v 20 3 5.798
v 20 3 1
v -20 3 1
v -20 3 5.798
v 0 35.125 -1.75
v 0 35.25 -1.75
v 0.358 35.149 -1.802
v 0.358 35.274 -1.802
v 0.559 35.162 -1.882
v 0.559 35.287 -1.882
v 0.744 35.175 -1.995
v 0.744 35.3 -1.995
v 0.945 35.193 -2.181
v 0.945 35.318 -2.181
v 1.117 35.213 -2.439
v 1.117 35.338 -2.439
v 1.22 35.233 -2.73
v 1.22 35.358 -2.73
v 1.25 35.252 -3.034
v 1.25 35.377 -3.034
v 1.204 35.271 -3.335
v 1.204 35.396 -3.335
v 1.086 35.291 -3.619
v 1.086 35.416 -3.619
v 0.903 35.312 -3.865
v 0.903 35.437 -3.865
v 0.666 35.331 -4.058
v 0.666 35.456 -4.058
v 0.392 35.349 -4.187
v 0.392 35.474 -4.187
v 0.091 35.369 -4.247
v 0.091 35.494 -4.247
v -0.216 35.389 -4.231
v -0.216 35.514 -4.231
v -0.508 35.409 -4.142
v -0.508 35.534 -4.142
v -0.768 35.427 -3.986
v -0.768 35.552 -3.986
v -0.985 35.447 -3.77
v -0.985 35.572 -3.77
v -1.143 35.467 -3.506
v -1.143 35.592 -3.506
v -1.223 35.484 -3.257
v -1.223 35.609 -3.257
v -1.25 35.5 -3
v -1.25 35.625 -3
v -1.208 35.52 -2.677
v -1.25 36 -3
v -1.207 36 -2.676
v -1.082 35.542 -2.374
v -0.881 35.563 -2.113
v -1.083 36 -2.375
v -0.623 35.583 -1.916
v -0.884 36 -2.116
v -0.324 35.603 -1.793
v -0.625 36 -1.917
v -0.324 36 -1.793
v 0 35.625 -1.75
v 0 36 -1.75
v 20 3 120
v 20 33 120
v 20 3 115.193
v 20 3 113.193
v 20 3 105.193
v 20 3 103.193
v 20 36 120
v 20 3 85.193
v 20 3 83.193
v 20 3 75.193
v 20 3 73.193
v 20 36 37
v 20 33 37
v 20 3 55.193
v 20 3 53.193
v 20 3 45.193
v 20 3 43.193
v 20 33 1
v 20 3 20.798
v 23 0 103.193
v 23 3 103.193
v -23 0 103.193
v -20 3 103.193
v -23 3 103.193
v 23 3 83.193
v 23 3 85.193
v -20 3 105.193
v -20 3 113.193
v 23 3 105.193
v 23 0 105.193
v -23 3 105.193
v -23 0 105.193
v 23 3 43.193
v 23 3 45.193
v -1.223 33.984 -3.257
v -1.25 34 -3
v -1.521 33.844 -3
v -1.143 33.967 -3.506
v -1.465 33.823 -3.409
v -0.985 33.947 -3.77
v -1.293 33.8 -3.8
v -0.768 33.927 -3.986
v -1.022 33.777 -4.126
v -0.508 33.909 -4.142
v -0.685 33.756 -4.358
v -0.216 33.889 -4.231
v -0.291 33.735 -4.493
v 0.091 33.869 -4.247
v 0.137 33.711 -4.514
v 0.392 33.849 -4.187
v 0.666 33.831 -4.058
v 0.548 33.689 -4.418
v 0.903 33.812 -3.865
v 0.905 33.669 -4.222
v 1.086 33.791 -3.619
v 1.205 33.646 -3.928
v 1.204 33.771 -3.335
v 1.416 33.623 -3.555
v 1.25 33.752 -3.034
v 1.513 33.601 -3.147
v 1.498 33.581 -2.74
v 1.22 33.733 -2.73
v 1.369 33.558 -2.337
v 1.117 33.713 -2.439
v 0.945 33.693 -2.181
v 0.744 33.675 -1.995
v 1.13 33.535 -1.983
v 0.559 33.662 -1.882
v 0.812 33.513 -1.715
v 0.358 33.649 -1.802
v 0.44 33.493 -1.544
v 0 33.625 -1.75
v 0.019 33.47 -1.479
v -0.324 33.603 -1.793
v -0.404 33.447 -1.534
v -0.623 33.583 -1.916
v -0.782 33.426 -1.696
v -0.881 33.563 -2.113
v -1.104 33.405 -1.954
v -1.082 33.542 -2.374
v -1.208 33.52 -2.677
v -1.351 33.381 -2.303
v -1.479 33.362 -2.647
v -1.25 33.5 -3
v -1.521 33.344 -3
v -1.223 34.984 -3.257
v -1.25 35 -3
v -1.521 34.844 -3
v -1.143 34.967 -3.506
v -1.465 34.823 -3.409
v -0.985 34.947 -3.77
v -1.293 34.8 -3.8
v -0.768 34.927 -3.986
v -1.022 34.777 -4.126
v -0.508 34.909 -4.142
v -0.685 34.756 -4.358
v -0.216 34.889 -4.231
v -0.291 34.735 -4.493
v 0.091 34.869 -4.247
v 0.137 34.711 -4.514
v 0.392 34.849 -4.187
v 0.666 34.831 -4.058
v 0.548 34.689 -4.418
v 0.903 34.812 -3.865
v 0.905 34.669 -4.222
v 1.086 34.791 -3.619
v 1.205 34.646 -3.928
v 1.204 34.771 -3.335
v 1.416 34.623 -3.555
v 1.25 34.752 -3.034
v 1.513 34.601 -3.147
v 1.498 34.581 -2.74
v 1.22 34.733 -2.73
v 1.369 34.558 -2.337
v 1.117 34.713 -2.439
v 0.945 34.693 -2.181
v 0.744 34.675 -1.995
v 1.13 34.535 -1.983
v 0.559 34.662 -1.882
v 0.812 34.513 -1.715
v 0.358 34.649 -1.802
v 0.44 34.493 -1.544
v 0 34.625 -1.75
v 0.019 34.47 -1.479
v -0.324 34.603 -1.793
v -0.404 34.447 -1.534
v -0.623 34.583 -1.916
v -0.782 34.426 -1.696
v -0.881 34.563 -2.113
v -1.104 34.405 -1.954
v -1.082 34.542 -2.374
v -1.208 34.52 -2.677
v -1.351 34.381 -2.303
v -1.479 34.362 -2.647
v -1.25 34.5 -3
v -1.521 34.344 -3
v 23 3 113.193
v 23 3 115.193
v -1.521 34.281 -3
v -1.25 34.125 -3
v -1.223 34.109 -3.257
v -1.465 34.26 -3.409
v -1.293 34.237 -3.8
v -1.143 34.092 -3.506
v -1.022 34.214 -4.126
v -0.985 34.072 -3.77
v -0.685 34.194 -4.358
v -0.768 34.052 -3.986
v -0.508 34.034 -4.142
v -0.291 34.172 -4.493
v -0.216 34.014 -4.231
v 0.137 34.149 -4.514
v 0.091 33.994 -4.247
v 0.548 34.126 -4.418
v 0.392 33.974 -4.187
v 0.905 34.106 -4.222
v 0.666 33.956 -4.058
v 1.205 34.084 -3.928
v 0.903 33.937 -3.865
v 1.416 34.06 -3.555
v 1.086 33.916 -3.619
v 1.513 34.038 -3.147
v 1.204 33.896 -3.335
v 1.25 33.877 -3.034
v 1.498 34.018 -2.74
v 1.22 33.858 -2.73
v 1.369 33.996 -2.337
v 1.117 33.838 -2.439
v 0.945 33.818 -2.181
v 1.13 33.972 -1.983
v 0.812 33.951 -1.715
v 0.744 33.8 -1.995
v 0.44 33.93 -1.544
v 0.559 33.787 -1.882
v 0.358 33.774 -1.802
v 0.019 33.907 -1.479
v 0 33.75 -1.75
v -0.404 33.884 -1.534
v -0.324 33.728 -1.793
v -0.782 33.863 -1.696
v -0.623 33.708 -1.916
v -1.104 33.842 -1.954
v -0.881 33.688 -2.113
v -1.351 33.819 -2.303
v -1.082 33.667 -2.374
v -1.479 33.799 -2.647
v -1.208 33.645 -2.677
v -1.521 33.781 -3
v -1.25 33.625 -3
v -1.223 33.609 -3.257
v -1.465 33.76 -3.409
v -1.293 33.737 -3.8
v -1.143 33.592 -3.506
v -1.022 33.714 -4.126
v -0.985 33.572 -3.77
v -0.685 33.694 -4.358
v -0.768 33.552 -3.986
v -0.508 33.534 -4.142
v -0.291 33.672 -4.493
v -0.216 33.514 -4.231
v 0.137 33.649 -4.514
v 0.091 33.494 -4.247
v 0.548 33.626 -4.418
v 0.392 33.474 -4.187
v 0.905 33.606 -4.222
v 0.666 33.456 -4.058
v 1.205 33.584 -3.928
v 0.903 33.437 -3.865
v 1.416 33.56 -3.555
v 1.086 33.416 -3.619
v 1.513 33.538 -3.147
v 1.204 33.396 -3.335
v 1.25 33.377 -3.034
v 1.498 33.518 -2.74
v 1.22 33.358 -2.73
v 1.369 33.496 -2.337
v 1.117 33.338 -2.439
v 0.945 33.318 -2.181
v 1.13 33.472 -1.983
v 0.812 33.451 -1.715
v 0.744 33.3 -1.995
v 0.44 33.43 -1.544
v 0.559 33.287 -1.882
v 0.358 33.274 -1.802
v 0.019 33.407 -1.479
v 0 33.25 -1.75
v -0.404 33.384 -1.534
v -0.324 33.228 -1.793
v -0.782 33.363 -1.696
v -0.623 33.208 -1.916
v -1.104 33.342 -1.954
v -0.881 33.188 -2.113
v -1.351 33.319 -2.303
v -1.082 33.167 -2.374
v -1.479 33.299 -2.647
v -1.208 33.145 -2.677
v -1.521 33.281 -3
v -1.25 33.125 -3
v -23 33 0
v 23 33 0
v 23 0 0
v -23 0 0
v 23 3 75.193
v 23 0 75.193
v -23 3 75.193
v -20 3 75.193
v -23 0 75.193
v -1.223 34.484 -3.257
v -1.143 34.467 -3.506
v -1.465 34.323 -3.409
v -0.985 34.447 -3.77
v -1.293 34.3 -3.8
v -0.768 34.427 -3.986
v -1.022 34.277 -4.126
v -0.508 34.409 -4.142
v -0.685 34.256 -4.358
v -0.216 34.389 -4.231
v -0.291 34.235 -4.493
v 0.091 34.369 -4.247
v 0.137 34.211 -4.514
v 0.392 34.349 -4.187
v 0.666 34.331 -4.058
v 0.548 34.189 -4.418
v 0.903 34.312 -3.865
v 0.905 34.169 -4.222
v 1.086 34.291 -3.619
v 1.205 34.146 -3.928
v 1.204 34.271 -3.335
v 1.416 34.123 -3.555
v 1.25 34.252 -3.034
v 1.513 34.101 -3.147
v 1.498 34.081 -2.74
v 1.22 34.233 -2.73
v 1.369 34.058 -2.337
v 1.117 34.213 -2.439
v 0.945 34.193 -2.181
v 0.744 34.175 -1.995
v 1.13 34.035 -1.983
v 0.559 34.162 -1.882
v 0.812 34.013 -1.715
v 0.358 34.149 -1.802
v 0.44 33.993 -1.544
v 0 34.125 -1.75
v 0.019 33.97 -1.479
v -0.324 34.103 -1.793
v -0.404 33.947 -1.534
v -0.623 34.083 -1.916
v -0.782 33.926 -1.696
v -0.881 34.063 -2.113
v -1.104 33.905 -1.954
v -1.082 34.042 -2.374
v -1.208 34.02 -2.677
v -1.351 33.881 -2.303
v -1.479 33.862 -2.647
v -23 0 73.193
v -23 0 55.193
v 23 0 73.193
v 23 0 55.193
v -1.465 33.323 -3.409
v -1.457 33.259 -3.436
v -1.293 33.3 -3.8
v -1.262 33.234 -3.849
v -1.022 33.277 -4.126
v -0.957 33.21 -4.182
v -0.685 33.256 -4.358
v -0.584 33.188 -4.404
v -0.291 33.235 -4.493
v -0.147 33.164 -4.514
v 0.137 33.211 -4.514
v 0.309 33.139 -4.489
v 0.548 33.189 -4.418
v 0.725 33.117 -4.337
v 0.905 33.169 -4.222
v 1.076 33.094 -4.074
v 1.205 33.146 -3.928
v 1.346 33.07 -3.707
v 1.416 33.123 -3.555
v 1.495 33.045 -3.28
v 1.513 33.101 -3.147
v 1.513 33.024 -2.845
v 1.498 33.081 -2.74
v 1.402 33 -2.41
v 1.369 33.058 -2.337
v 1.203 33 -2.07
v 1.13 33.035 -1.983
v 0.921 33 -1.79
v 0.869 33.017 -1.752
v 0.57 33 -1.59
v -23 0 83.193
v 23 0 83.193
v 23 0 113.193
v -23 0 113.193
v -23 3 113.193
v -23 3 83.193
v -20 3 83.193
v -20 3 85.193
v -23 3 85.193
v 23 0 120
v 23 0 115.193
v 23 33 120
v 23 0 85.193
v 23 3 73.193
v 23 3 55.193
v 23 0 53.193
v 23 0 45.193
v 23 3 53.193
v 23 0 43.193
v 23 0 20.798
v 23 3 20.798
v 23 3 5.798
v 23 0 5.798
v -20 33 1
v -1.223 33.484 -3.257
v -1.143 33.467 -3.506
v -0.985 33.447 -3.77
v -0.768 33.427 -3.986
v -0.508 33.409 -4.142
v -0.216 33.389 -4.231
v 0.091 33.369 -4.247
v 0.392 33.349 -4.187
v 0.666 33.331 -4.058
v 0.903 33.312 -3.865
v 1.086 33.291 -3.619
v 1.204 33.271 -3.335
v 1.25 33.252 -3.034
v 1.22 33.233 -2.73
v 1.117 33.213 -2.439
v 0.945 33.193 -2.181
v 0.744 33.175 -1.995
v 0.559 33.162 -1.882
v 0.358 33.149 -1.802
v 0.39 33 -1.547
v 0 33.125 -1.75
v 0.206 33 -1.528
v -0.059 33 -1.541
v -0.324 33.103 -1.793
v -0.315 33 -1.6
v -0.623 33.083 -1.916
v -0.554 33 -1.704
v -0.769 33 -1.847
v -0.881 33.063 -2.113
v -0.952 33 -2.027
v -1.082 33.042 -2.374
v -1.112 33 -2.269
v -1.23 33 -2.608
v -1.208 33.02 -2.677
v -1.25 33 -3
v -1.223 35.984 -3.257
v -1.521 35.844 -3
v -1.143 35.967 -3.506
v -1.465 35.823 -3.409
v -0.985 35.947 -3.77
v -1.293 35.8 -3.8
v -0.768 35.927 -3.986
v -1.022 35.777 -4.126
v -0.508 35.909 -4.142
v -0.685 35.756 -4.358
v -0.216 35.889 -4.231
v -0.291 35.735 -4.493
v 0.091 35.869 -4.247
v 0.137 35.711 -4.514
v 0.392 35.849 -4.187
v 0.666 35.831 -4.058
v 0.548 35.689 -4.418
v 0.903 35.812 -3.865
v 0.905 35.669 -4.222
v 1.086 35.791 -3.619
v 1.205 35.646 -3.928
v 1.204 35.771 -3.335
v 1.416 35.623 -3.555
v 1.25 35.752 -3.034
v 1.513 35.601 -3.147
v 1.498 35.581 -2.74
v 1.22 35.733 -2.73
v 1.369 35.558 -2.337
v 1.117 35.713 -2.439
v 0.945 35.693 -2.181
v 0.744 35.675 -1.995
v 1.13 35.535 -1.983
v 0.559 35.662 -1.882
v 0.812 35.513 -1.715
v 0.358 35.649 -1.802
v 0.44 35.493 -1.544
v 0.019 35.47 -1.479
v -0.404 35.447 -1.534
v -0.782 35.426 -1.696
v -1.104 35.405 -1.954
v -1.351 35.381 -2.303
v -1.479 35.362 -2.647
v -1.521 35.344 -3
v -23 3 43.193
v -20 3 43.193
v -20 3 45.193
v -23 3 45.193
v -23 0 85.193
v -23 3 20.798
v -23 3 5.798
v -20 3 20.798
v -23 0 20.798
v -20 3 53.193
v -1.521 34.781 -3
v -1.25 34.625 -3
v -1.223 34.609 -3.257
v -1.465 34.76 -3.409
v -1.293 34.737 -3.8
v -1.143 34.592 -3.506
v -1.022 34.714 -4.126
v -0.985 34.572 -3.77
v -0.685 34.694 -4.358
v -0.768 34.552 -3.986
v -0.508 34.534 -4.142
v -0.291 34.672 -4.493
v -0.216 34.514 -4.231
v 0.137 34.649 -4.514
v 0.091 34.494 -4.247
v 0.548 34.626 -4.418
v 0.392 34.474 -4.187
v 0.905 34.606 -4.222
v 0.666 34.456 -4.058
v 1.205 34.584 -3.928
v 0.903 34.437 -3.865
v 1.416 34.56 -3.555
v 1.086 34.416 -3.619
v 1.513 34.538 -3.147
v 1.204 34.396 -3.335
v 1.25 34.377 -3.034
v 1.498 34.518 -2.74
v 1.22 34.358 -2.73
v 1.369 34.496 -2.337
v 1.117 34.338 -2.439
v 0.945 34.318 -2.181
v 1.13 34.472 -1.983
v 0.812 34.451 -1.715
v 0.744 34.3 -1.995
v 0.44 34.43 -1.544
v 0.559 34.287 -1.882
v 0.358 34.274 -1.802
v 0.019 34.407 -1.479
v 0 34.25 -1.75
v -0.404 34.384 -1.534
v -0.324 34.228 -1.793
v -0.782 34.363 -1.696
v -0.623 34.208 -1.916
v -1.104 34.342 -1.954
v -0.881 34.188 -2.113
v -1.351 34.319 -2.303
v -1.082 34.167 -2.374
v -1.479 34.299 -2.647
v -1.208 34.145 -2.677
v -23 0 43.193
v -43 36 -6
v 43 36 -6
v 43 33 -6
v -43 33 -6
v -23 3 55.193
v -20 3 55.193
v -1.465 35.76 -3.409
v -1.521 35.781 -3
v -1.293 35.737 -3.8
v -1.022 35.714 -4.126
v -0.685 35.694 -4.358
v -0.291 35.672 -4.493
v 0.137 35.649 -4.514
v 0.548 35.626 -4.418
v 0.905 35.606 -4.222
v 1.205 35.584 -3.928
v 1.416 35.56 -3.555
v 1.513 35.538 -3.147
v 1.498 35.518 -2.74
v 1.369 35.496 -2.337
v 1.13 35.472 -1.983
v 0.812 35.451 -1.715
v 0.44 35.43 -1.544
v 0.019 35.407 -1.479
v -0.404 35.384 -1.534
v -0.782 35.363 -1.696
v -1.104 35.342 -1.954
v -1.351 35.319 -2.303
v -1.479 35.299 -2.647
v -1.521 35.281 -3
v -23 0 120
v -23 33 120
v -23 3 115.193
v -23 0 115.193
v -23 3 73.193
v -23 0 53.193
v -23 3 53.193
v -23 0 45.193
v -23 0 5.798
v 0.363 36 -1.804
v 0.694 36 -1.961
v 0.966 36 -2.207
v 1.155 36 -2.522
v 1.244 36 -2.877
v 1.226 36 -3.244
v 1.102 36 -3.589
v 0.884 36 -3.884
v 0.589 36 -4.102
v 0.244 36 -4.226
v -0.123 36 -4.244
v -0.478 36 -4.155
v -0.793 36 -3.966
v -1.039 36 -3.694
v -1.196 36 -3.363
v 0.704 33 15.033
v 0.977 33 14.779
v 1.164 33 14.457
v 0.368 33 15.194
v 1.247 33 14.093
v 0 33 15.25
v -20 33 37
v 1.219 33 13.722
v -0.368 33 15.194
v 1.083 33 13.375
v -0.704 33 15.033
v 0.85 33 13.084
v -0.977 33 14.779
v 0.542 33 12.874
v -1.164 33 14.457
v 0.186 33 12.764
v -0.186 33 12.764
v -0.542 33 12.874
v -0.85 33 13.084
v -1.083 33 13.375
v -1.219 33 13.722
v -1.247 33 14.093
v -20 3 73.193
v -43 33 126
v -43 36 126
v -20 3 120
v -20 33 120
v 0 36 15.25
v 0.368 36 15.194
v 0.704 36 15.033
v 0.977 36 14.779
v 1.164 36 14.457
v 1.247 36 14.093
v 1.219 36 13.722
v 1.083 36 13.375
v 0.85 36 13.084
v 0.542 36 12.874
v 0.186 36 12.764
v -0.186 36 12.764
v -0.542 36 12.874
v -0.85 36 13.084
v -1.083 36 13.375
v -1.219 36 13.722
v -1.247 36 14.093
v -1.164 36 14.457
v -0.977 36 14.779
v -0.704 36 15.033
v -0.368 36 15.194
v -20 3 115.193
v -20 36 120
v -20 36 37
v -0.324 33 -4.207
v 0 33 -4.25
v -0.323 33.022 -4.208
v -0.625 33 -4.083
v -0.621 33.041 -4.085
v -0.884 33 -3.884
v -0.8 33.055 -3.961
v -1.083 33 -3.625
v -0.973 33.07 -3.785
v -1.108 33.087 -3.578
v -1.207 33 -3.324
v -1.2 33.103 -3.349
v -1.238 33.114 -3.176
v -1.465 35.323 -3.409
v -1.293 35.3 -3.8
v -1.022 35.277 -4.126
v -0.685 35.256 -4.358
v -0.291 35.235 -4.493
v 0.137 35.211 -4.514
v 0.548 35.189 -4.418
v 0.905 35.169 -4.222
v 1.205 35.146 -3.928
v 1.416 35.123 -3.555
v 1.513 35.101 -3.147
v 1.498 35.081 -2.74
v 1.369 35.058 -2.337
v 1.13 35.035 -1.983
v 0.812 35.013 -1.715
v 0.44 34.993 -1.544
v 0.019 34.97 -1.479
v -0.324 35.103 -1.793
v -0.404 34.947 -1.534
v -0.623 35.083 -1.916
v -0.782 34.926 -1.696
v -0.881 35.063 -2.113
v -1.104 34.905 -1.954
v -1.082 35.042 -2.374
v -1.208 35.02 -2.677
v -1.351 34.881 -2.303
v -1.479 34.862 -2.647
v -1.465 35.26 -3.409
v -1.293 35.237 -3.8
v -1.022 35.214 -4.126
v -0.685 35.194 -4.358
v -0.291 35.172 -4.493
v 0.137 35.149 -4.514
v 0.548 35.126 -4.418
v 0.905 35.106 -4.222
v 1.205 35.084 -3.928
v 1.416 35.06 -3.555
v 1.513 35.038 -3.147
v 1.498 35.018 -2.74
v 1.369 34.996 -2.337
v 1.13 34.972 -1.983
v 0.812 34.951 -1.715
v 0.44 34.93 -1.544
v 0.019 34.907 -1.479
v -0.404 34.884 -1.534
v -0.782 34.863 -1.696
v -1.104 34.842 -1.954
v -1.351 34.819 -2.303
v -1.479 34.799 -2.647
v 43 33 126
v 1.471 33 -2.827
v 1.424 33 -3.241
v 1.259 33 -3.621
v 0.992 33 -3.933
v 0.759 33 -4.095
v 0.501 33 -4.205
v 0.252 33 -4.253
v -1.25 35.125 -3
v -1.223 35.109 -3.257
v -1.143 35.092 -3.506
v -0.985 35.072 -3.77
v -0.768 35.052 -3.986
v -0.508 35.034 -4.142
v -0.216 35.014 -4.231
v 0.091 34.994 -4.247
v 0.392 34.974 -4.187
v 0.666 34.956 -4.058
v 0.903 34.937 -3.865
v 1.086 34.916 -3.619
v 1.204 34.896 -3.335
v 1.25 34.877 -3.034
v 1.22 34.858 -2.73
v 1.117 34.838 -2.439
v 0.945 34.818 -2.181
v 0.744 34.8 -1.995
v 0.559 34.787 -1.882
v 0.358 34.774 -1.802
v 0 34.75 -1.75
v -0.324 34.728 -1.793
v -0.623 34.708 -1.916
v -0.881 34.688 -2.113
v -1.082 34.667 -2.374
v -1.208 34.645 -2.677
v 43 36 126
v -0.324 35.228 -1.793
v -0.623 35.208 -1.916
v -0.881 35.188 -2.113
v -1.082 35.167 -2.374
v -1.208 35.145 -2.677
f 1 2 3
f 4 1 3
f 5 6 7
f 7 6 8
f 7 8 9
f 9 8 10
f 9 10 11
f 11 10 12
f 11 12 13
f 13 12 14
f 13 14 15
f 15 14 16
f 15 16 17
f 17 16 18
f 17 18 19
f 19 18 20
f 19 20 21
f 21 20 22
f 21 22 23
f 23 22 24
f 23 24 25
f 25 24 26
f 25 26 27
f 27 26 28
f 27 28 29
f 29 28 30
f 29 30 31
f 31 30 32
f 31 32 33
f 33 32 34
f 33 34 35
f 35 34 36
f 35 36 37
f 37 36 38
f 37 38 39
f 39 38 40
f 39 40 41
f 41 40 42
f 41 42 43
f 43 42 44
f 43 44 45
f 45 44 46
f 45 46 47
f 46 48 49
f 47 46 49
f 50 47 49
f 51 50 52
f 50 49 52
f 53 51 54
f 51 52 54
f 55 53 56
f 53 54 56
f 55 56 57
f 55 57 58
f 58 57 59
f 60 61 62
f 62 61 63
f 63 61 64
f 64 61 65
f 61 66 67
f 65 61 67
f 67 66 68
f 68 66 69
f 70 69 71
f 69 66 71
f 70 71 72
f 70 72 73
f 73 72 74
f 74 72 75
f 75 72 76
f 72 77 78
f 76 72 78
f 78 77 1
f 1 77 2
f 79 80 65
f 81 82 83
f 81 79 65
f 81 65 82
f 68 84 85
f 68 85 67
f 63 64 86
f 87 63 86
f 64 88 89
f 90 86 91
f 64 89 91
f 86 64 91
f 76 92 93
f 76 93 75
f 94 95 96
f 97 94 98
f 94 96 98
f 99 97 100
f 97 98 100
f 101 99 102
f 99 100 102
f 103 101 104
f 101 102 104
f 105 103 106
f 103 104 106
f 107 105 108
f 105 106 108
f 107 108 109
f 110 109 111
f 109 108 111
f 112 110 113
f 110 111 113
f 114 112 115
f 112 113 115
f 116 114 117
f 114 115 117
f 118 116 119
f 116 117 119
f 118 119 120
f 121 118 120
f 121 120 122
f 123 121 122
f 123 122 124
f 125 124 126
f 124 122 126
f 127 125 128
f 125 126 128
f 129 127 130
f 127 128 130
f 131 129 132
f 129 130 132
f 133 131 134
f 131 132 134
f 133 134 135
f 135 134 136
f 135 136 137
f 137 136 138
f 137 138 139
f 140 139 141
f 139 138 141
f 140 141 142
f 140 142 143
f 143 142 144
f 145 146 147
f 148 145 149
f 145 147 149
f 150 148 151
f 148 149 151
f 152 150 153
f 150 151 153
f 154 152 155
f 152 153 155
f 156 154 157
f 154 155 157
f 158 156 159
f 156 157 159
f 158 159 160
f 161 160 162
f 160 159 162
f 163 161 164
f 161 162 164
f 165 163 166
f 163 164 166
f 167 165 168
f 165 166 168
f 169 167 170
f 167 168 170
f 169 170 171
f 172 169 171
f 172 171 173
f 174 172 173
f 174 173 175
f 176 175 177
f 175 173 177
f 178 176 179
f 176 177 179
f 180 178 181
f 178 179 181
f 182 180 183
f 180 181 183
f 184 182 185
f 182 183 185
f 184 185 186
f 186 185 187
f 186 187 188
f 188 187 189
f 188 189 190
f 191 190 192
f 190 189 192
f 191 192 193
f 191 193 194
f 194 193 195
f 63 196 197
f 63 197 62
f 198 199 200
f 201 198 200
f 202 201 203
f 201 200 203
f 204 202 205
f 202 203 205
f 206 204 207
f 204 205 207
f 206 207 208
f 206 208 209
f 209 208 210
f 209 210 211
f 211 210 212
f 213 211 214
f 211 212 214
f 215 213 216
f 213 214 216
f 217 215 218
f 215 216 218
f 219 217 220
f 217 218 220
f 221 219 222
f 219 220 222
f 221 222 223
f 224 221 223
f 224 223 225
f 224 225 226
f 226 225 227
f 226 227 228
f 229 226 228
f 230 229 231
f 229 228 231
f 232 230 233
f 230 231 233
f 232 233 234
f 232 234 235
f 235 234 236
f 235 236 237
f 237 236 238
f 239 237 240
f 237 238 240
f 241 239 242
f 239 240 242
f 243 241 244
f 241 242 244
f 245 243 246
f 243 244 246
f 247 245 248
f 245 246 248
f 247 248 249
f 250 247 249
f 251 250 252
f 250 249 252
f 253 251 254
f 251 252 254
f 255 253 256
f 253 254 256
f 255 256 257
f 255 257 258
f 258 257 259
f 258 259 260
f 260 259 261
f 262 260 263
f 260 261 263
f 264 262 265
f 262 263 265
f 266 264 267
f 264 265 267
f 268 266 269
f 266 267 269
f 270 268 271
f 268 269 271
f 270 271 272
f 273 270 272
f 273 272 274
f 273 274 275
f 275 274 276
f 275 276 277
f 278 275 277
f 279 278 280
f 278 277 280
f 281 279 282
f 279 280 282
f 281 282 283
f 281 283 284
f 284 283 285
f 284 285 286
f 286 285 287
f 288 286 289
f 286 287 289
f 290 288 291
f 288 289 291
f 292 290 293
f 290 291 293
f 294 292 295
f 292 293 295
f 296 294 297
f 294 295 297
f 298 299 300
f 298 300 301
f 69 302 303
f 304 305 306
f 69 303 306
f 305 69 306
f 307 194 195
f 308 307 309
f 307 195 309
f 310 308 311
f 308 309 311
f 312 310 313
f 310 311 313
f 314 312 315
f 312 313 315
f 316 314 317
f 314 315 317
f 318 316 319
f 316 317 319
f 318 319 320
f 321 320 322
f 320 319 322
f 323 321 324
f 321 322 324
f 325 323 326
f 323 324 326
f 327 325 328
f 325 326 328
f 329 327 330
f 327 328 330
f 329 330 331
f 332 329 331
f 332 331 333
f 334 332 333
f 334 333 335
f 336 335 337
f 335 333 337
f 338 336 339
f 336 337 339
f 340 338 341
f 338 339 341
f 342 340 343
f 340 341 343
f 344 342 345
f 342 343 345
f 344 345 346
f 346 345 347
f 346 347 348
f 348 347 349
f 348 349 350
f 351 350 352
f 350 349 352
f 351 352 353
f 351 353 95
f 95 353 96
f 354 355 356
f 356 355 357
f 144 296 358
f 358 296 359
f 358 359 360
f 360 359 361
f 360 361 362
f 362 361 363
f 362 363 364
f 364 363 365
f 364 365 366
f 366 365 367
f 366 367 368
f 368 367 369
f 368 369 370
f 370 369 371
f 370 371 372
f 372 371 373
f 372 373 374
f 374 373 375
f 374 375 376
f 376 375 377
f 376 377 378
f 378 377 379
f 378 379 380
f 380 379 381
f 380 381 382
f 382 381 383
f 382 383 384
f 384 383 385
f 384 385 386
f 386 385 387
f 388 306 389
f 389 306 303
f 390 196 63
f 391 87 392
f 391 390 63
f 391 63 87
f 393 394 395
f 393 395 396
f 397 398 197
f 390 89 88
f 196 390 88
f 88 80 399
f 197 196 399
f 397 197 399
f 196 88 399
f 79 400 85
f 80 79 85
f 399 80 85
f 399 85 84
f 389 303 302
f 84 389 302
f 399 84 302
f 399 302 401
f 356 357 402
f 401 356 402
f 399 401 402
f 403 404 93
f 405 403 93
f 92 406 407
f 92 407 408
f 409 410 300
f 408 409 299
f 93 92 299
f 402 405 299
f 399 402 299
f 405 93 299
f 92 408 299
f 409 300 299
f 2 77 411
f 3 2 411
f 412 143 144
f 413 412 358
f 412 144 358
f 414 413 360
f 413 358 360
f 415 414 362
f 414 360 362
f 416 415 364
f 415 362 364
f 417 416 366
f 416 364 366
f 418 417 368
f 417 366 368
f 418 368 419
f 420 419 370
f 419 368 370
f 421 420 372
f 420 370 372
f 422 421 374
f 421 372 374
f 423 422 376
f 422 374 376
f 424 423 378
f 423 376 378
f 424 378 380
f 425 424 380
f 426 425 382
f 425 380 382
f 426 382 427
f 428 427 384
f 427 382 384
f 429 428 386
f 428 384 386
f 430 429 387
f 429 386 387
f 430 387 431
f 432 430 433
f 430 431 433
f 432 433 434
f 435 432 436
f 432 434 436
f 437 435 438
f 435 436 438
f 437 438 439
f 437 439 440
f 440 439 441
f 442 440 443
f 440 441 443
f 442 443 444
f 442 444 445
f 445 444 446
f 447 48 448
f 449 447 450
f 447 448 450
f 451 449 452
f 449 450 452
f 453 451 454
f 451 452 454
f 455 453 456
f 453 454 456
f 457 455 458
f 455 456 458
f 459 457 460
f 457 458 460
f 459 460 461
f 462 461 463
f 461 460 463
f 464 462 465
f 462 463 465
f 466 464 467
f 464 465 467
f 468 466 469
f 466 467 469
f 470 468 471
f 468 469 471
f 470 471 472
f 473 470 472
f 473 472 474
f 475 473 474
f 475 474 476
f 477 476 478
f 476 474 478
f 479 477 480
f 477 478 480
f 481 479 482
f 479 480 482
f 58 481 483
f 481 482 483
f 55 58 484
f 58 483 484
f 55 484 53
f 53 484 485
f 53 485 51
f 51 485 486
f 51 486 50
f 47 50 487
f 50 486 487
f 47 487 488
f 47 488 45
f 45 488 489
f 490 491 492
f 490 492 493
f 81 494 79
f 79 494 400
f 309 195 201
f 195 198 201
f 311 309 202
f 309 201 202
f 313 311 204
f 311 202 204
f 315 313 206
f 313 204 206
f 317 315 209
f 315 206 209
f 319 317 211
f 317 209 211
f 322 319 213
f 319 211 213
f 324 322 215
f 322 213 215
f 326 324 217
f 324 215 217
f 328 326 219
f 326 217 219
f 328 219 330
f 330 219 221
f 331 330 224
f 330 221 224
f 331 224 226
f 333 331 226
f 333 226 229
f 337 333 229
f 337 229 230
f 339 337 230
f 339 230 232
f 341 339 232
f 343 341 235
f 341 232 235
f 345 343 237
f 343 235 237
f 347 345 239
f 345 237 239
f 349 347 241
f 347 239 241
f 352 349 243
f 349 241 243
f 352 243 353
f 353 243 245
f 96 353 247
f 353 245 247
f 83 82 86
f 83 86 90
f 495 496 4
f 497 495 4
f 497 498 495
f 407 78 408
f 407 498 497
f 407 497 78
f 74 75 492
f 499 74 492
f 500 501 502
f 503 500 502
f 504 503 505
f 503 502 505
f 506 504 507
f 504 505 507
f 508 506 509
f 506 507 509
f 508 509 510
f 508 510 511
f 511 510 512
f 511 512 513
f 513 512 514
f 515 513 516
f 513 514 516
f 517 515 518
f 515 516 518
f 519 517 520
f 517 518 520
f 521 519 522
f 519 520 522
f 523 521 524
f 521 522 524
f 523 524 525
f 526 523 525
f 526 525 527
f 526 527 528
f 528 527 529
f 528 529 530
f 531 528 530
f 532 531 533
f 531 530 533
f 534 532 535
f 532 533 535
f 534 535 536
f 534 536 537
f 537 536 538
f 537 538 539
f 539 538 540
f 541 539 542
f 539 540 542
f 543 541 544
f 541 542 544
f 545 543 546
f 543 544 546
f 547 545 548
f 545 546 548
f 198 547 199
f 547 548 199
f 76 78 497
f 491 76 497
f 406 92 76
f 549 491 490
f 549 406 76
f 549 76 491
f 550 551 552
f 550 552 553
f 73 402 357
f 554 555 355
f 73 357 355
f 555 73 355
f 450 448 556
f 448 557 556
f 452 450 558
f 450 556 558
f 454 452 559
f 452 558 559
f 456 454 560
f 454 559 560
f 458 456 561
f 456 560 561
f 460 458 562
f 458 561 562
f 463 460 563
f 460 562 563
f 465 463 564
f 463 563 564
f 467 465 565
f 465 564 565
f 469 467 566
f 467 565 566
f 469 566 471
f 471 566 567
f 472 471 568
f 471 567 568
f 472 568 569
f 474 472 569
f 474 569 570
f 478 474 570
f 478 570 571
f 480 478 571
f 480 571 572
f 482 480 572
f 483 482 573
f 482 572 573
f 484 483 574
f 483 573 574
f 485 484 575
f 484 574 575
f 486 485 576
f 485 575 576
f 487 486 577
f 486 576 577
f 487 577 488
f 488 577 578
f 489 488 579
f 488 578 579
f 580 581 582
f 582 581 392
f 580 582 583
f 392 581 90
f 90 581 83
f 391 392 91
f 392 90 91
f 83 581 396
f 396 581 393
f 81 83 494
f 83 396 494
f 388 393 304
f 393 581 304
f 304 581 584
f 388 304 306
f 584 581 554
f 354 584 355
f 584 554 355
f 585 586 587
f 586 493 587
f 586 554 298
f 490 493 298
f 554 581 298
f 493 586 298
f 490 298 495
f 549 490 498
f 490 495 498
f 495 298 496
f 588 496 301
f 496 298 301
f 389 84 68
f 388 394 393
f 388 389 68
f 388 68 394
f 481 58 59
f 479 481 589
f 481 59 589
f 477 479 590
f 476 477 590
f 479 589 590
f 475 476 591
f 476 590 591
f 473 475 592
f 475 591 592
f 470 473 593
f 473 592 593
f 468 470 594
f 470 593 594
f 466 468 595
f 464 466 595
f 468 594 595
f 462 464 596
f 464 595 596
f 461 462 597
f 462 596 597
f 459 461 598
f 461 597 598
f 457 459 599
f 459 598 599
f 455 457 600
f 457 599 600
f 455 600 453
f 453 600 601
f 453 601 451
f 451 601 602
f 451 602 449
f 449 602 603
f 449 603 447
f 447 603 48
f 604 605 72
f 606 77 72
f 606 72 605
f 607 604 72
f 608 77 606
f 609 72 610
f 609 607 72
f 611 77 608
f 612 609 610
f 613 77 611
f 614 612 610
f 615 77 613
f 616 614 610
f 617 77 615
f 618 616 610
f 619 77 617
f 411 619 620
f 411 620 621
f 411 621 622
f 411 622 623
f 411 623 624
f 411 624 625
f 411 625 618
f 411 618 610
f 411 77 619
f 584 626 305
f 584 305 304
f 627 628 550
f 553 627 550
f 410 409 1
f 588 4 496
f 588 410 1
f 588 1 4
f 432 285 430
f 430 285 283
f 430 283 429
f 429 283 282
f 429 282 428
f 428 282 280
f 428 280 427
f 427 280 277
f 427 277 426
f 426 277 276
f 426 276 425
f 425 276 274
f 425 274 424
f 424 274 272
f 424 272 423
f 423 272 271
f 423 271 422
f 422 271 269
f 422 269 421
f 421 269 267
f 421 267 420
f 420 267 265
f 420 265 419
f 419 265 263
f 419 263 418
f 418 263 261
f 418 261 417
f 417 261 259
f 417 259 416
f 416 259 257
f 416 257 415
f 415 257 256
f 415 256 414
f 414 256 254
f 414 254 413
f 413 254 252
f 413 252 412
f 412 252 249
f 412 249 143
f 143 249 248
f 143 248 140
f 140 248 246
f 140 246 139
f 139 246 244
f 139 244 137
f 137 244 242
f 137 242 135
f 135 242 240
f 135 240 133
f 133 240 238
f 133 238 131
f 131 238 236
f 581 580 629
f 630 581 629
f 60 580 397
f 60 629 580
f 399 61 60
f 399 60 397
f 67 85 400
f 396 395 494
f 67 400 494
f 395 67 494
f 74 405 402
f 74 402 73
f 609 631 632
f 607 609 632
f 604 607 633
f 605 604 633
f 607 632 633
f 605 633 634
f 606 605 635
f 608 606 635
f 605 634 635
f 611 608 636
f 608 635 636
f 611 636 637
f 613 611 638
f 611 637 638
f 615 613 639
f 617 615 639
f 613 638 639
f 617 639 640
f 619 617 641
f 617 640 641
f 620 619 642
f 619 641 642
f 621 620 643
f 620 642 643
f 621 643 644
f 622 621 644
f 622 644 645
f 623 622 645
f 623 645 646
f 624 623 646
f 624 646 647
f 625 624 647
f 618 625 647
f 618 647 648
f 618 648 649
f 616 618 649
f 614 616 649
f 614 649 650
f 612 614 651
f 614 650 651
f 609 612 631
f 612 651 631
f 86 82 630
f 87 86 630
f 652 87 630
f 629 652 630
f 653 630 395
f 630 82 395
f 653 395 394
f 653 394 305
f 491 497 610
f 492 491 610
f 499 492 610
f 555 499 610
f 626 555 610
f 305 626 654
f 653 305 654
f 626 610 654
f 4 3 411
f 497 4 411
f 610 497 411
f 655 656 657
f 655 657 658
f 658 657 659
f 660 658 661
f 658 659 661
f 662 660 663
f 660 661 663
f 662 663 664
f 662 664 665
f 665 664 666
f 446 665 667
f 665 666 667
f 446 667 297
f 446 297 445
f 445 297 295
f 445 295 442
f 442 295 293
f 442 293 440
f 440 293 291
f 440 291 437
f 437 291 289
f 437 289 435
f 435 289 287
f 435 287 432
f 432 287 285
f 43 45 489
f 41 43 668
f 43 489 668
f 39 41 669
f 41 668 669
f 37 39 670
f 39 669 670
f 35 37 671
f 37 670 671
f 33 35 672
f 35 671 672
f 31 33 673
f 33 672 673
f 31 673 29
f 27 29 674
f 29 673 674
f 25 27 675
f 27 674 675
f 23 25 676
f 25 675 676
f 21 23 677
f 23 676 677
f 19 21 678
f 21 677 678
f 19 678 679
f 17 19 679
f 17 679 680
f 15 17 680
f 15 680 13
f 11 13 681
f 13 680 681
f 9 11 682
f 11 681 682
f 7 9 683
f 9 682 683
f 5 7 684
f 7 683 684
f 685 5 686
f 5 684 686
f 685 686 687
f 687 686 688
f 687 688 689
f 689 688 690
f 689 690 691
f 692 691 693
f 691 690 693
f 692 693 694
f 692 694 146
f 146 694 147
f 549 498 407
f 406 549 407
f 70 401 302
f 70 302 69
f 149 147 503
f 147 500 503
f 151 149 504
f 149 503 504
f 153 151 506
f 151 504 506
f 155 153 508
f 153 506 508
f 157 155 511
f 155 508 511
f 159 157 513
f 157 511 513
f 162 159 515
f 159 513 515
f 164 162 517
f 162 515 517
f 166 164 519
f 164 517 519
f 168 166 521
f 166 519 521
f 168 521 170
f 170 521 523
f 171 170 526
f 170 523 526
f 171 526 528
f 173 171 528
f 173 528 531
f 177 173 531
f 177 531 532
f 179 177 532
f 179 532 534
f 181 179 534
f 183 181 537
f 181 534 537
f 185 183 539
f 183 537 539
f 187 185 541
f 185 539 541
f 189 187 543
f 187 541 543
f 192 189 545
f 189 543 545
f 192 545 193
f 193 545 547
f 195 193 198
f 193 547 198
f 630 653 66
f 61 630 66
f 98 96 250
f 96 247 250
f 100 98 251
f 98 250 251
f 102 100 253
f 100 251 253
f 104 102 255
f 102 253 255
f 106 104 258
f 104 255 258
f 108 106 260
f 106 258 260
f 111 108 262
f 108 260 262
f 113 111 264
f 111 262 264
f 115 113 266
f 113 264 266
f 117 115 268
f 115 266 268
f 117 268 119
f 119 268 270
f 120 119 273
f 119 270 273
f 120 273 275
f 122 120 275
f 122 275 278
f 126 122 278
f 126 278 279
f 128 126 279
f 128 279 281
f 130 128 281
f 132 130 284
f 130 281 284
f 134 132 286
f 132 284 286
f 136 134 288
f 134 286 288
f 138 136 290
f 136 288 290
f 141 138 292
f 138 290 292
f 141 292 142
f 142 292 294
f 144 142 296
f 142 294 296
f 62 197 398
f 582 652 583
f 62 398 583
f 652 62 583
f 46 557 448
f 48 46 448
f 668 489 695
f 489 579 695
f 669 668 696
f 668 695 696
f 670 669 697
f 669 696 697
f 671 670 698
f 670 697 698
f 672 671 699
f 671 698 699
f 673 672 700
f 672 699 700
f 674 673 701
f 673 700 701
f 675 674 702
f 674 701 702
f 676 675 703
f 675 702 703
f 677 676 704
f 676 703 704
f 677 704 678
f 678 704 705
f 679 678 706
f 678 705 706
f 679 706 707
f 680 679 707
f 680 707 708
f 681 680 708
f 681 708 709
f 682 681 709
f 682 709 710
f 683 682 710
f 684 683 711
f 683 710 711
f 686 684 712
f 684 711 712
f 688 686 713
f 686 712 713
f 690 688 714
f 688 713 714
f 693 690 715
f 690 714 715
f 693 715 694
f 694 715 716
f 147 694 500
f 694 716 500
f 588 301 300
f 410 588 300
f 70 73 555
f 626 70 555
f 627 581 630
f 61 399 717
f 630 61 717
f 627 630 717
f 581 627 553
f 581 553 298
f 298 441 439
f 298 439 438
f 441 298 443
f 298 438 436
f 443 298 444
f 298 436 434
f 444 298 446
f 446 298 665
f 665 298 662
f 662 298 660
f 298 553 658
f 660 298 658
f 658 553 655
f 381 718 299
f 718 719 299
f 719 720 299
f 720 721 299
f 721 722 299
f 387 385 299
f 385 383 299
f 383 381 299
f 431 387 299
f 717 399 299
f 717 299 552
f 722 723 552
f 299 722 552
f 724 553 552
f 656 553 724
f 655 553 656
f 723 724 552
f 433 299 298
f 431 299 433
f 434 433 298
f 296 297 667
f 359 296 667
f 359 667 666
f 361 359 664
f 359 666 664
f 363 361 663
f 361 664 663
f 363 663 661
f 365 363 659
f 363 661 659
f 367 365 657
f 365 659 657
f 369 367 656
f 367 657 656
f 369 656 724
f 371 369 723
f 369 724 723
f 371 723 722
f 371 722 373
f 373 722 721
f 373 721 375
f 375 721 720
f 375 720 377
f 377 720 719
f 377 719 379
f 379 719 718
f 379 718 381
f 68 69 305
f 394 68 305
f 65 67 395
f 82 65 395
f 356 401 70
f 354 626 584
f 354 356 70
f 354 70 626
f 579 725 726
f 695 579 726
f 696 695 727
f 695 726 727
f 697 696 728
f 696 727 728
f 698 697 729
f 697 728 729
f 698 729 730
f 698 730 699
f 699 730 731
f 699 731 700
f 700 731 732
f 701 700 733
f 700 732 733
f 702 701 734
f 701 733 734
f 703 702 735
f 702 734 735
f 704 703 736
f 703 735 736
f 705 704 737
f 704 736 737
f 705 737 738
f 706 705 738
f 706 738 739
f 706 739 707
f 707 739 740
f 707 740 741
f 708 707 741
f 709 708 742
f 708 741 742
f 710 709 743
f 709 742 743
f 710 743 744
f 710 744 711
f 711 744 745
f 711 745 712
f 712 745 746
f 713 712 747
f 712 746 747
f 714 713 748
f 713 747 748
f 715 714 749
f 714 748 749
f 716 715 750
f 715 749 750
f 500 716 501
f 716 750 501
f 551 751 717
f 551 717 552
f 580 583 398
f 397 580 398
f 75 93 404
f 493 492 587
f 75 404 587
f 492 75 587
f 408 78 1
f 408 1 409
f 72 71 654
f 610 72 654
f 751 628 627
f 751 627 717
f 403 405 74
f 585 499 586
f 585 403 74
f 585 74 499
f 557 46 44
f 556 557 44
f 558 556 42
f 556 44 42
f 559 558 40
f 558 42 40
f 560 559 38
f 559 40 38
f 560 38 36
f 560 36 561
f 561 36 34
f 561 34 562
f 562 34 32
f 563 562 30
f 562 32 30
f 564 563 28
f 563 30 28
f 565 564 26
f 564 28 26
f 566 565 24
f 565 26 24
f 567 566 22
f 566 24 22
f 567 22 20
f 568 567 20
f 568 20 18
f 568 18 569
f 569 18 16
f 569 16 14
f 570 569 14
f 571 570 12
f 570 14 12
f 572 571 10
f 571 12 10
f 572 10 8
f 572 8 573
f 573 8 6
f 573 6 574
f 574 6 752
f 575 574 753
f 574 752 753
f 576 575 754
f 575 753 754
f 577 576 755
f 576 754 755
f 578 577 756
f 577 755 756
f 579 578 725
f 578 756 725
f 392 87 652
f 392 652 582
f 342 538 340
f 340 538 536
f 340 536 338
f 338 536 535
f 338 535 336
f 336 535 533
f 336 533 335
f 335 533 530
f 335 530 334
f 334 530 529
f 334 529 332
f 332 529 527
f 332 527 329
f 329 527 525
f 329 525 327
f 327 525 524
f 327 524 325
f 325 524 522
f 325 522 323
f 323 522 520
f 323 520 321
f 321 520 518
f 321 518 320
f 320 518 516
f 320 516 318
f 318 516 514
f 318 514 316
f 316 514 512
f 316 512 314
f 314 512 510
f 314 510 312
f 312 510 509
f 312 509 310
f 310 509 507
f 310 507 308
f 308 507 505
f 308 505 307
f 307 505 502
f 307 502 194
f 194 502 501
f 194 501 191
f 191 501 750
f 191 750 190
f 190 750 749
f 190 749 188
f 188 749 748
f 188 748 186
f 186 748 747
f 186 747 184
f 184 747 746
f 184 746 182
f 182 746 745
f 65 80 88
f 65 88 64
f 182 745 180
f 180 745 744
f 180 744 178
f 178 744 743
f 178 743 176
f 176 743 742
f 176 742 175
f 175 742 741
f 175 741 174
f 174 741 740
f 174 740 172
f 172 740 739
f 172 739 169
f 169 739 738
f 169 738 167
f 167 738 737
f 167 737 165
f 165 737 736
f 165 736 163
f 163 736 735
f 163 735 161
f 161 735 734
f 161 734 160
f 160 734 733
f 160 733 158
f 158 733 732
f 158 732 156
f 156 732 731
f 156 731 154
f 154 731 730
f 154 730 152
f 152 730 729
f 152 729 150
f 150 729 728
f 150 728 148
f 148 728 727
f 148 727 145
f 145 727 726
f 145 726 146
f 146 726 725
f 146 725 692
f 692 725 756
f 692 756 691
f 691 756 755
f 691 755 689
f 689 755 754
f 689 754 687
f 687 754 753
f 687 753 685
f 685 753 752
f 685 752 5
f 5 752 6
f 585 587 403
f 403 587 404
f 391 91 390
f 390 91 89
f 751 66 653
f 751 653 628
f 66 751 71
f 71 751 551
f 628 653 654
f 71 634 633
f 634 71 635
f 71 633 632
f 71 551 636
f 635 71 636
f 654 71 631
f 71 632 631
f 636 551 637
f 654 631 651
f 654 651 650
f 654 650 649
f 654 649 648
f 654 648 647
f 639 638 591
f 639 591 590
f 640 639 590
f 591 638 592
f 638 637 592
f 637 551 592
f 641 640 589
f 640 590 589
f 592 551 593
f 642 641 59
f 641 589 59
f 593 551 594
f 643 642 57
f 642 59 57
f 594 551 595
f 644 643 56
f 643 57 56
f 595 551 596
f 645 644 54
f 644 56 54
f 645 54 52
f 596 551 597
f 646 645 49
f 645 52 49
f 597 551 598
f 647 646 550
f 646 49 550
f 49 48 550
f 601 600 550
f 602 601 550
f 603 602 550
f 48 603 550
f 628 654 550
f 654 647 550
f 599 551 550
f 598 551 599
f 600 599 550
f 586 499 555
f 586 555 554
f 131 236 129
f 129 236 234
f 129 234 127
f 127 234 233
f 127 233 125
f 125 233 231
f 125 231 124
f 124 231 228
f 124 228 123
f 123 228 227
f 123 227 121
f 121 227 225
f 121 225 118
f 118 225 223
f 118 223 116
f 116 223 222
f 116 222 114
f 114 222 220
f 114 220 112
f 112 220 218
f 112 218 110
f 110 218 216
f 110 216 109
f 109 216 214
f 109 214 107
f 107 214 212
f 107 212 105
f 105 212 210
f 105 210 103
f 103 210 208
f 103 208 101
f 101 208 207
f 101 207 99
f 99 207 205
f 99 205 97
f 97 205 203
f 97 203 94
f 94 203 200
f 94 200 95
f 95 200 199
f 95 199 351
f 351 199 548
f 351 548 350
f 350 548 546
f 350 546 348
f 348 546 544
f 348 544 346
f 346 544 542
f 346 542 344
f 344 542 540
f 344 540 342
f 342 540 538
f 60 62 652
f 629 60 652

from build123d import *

# Parameters (mm, degrees)
BOSS_EXTRUDE1_DEPTH = 120
BOSS_EXTRUDE2_DEPTH = 1
SKETCH24_R          = 1.2500000000000002
BOSS_EXTRUDE5_DEPTH = 3
THREAD2_PITCH       = 0.5
SKETCH27_W          = 86
SKETCH27_H          = 6
BOSS_EXTRUDE6_DEPTH = 3
SKETCH28_R          = 1.250000000000001
BOSS_EXTRUDE7_DEPTH = 3
SKETCH29_W          = 46
SKETCH29_H          = 2
SKETCH29_H_2        = 2.000000000000014
SKETCH29_H_3        = 2.0000000000000284
CUT_EXTRUDE1_DEPTH  = 3


with BuildPart() as part:
    # Sketch1 → Boss-Extrude1 (new body)
    with BuildSketch(Plane.XY):
        Polygon((0, 0), (23, 0), (23, 33), (43, 33), (43, 36.00000000000001), (20, 36.00000000000001), (20.000000000000004, 2.9999999999999973), (-19.999999999999996, 2.9999999999999973), (-20, 36.000000000000014), (-43, 36.000000000000014), (-43, 33.00000000000001), (-23, 33), (-23, -2.82e-15), align=None)
    extrude(amount=BOSS_EXTRUDE1_DEPTH)

    # Sketch2 → Boss-Extrude2 (add)
    with BuildSketch(Plane.XY):
        Polygon((-20, 36.000000000000014), (20, 36.000000000000014), (20.000000000000004, 2.9999999999999973), (-19.999999999999996, 2.9999999999999973), align=None)
    extrude(amount=BOSS_EXTRUDE2_DEPTH)

    # Sketch24 → Boss-Extrude5 (add)
    # profile 1 of 2: a face of its own
    with BuildSketch(Plane(origin=(0, 36.000000000000014, 0), x_dir=(1, 0, 0), z_dir=(0, 1, 0))):
        Polygon((-43.000000000000014, 6), (-43, 0), (43, 0), (43, 6.000000000000011), align=None)
        with Locations(Location((0, 3, 0), (0, 0, 270))):
            Circle(SKETCH24_R, mode=Mode.SUBTRACT)
    # profile 2 of 2: a face of its own
    with BuildSketch(Plane(origin=(0, 36.000000000000014, 0), x_dir=(1, 0, 0), z_dir=(0, 1, 0))):
        Polygon((43, 0), (-43, 0), (-43, -120), (-20, -120), (-20, -1), (20, -1.0000000000000009), (20, -120), (43, -120), align=None)
    extrude(amount=-BOSS_EXTRUDE5_DEPTH)

    # Thread2: the profile of 螺纹线轮廓4 profile screwed along a right-hand helix of 6 turns, 6 arcs to a turn; built about Z, then put on its axis
    thread2_z = Axis((0, 0, 0), (0, 0, 1))
    thread2_corners = [(1.2497, 0, -0.000173205), (1.520632938, 0, 0.156249999), (1.520632938, 0, 0.218749999), (1.2497, 0, 0.375173204)]
    with BuildLine(mode=Mode.PRIVATE) as thread2_profile:
        Line(thread2_corners[0], thread2_corners[1])
        Line(thread2_corners[1], thread2_corners[2])
        Line(thread2_corners[2], thread2_corners[3])
        Line(thread2_corners[3], thread2_corners[0])
    thread2_cap = Face(thread2_profile.wire())
    thread2_turn_angles = [0, 30, 60, 90, 120, 150, 180, 210, 240, 270, 300, 330, 360]
    thread2_turn_weights = [1, 0.8660254037844387, 1, 0.8660254037844387, 1, 0.8660254037844387, 1, 0.8660254037844387, 1, 0.8660254037844387, 1, 0.8660254037844387, 1]
    thread2_turn_rails = [Edge.make_bspline([Vector(p[0], p[1], 0).rotate(thread2_z, thread2_turn_angles[k]) / thread2_turn_weights[k] + Vector(0, 0, p[2] + THREAD2_PITCH * thread2_turn_angles[k] / 360) for k in range(13)], [0, 0, 0, 1, 1, 2, 2, 3, 3, 4, 4, 5, 5, 6, 6, 6], 2, thread2_turn_weights) for p in thread2_corners]
    thread2_turn_sides = [Face.make_surface_from_curves(thread2_turn_rails[p[0]], thread2_turn_rails[p[1]]) for p in [(0, 1), (1, 2), (2, 3), (3, 0)]]
    thread2 = Plane(origin=(0, 36, -3), x_dir=(-1, 0, 0), z_dir=(0, -1, 0)) * Solid(Shell([*[p.moved(Location((0, 0, THREAD2_PITCH * i))) for i in range(6) for p in thread2_turn_sides], thread2_cap, thread2_cap.rotate(thread2_z, 2160).moved(Location((0, 0, THREAD2_PITCH * 2160 / 360)))]))
    add(thread2, mode=Mode.SUBTRACT)

    # Sketch27 → Boss-Extrude6 (add)
    with BuildSketch(Plane(origin=(0, 36.000000000000014, 0), x_dir=(1, 0, 0), z_dir=(0, 1, 0))):
        with Locations((-3.55e-15, -123.00000000000001)):
            Rectangle(SKETCH27_W, SKETCH27_H)
    extrude(amount=-BOSS_EXTRUDE6_DEPTH)

    # Sketch28 → Boss-Extrude7 (add)
    with BuildSketch(Plane(origin=(0, 36.000000000000014, 0), x_dir=(1, 0, 0), z_dir=(0, 1, 0))):
        Polygon((-19.999999999999996, -1.0000000000000009), (20.000000000000004, -1.0000000000000009), (20.000000000000004, -37.00000000000001), (-19.99999999999999, -37), align=None)
        with Locations(Location((0, -14.000000000000002, 0), (0, 0, 270))):
            Circle(SKETCH28_R, mode=Mode.SUBTRACT)
    extrude(amount=-BOSS_EXTRUDE7_DEPTH)

    # Sketch29 → Cut-Extrude1 (cut)
    with BuildSketch(Plane(origin=(0, 0, 0), x_dir=(-1, 0, 0), z_dir=(0, -1, 0))):
        Polygon((-23, -5.798088818556618), (23, -5.798088818556618), (23, -20.798088818556618), (-22.999999999999996, -20.798088818556618), align=None)
        with Locations((0, -44.19328812281581)):
            Rectangle(SKETCH29_W, SKETCH29_H)
        with Locations((1.0303e-13, -54.193288122815815)):
            Rectangle(SKETCH29_W, SKETCH29_H_2)
        with Locations((3.1264e-13, -74.19328812281582)):
            Rectangle(SKETCH29_W, SKETCH29_H)
        with Locations((4.1567e-13, -84.19328812281582)):
            Rectangle(SKETCH29_W, SKETCH29_H)
        with Locations((6.2528e-13, -104.19328812281582)):
            Rectangle(SKETCH29_W, SKETCH29_H_3)
        with Locations((7.2831e-13, -114.19328812281583)):
            Rectangle(SKETCH29_W, SKETCH29_H)
    extrude(amount=-CUT_EXTRUDE1_DEPTH, mode=Mode.SUBTRACT)


solid = part.part
